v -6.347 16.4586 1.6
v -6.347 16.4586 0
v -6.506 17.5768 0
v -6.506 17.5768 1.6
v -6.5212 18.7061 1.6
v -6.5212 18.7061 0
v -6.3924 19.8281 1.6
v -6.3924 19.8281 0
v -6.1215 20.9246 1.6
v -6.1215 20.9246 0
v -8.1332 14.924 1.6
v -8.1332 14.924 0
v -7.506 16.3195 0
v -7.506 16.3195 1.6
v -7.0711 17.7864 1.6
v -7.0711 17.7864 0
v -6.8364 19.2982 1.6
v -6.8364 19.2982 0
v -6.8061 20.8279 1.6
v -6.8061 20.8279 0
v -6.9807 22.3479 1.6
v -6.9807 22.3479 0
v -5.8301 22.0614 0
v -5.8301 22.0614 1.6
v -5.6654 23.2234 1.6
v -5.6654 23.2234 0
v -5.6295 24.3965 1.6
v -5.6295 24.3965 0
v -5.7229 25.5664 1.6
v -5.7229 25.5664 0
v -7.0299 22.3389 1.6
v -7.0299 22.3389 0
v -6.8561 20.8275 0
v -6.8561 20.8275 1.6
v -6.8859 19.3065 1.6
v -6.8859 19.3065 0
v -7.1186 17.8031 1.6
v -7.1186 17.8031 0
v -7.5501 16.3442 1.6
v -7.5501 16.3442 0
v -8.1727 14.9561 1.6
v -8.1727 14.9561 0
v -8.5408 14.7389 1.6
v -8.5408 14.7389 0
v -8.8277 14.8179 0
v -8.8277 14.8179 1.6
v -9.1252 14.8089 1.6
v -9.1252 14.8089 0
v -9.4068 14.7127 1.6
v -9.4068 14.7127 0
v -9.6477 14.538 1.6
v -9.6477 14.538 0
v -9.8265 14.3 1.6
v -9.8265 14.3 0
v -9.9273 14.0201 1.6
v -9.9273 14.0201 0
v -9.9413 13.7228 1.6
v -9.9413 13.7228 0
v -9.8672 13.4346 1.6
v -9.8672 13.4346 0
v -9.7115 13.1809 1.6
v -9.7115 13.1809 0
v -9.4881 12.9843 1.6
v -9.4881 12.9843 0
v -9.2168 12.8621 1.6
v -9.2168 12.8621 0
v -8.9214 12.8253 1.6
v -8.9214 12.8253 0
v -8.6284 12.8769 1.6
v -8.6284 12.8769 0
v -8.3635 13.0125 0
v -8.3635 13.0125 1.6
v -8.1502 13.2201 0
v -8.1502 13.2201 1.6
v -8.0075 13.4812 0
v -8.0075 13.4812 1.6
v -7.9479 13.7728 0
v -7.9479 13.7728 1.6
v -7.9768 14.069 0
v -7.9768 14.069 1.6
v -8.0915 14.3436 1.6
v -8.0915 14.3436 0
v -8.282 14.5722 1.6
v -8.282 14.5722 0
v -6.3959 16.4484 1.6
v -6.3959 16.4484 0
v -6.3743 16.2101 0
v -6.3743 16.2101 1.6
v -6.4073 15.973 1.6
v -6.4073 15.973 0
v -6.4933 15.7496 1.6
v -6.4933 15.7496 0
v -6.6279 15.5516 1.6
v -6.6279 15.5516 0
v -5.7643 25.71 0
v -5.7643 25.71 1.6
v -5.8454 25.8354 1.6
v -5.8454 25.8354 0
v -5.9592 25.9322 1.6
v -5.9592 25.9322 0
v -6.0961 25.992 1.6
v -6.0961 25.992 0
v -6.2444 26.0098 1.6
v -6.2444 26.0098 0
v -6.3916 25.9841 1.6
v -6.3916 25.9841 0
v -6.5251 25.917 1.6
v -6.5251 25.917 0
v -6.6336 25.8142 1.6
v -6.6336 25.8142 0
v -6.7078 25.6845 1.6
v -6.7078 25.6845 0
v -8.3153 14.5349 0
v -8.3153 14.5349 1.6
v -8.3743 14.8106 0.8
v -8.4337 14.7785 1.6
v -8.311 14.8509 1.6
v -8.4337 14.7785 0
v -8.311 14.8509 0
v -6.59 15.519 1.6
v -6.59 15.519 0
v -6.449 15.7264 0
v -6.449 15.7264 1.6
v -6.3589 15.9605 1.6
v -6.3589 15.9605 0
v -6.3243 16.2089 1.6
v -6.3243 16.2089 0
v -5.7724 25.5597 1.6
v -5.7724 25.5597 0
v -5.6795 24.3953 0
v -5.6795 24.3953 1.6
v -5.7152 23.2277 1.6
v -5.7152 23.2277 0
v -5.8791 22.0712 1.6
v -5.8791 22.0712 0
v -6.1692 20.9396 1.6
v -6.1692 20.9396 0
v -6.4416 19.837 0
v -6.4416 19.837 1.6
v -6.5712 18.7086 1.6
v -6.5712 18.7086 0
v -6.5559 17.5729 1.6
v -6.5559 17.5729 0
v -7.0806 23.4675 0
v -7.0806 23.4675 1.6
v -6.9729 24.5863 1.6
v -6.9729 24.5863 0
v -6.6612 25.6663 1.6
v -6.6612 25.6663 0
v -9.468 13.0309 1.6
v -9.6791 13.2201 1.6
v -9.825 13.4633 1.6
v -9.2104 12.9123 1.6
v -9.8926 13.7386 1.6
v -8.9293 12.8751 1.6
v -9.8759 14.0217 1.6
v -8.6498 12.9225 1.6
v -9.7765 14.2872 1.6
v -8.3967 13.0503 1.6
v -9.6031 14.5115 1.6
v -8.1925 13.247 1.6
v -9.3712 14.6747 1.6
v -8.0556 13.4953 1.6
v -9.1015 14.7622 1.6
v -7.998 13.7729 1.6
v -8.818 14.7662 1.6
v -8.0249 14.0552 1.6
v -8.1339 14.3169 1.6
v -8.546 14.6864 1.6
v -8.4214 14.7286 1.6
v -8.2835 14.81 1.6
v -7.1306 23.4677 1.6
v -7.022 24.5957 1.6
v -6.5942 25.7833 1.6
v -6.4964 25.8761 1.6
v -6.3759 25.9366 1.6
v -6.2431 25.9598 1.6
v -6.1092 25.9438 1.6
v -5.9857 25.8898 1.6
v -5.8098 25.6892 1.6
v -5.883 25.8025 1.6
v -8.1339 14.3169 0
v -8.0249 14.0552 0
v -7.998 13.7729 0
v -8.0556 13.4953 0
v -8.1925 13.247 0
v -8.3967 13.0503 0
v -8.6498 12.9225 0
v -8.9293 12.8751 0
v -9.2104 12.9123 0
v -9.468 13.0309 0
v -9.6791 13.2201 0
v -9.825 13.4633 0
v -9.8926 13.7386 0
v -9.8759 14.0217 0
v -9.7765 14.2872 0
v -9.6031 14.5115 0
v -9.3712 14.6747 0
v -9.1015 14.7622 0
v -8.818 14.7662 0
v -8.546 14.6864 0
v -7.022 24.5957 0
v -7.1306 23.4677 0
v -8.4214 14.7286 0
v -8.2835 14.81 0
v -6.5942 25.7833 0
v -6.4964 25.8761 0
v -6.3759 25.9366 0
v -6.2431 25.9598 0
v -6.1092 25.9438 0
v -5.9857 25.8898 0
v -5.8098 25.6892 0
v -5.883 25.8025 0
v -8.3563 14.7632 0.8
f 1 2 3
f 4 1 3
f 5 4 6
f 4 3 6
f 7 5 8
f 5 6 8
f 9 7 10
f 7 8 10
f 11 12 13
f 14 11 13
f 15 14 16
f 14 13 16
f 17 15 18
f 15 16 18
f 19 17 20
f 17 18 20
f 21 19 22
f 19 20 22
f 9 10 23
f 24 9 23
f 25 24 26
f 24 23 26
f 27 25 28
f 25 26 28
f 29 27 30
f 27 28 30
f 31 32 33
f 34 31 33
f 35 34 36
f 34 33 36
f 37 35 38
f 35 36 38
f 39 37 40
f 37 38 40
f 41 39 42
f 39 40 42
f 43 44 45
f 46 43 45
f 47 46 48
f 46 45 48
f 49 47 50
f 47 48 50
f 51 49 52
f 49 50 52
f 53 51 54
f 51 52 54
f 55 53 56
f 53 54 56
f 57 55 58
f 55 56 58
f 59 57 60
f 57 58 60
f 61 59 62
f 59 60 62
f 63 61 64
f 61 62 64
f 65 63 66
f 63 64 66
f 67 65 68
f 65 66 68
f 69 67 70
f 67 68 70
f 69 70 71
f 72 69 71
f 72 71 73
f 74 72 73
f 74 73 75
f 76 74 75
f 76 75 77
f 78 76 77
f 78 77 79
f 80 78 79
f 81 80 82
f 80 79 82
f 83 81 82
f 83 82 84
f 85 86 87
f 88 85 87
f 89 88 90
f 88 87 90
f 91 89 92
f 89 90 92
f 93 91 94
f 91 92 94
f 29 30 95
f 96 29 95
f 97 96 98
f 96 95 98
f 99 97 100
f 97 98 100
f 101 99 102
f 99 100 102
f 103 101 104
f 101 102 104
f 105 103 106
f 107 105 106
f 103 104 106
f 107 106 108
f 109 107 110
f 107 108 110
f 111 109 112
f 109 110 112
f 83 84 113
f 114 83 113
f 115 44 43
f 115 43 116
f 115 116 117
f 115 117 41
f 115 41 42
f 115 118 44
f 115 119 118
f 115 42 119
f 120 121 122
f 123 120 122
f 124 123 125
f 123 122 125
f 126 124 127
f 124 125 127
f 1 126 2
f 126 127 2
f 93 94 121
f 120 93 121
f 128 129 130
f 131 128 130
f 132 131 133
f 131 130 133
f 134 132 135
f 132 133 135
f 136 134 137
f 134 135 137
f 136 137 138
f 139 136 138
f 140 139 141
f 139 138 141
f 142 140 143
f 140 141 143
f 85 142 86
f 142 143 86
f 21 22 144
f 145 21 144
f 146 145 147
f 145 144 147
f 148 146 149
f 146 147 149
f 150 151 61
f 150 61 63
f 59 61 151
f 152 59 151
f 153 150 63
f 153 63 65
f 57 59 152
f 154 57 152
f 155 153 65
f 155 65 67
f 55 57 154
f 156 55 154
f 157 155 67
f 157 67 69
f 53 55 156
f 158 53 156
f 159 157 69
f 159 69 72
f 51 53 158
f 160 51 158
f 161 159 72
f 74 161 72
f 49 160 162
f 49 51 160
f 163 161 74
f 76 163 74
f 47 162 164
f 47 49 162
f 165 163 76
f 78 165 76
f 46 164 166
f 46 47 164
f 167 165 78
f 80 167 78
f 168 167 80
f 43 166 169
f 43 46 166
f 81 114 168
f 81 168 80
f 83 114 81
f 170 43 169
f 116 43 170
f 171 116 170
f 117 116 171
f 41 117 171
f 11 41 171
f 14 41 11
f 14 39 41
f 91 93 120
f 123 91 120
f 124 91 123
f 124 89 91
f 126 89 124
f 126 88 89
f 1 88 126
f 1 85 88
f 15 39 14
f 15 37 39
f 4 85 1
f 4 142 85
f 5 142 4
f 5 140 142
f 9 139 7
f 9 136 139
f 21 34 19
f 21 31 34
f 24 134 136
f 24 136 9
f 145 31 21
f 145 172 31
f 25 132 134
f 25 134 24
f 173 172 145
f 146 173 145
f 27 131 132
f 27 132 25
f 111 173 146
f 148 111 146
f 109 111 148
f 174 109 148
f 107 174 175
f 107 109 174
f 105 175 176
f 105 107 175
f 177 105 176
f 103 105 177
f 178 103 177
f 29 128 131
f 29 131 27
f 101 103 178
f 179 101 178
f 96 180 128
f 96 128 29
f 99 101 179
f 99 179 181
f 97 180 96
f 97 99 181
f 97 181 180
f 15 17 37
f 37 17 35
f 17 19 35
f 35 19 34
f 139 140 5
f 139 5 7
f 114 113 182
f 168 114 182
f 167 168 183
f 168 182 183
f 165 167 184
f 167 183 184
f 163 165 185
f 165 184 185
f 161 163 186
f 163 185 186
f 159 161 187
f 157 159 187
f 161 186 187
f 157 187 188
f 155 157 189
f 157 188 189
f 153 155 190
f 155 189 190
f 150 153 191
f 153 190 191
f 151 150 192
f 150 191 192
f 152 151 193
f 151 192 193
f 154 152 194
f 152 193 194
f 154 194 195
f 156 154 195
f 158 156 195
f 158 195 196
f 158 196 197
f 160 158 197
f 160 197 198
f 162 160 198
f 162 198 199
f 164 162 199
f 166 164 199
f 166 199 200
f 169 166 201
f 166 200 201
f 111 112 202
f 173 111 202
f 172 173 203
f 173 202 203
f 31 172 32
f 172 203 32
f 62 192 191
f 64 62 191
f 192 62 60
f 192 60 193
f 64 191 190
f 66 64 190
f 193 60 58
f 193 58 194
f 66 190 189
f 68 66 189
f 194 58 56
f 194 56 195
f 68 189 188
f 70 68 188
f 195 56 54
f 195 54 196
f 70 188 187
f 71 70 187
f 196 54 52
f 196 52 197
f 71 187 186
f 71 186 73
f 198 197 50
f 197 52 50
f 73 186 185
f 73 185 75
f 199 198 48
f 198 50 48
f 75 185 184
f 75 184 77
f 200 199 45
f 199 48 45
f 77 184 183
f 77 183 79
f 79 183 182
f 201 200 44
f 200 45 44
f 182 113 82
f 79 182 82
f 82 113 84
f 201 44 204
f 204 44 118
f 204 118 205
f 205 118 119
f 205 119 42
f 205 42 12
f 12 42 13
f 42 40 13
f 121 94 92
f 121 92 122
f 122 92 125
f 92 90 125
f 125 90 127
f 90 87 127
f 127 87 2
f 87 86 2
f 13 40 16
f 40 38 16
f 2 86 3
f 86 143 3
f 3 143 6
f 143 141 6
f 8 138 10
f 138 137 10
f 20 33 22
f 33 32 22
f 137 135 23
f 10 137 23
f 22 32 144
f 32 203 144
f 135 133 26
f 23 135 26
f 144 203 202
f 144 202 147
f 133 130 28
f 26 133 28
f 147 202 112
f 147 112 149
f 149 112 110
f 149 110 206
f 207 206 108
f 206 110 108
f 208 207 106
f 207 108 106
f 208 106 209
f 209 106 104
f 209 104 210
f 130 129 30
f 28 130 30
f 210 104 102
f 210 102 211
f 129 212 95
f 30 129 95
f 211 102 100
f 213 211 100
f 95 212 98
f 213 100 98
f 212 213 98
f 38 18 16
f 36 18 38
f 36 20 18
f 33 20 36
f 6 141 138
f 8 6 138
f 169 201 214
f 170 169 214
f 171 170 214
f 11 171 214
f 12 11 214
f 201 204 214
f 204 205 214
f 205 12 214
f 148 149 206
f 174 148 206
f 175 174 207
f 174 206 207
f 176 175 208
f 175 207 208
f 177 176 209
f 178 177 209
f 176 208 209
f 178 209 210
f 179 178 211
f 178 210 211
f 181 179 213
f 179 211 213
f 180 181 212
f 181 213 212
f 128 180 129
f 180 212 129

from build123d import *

# Parameters (mm, degrees)
BOSS_EXTRUDE1_DEPTH = 1.6


with BuildPart() as part:
    # Sketch1 → Boss-Extrude1 (new body)
    with BuildSketch(Plane.XY):
        with BuildLine():
            Line((-8.282035958, 14.5722307), (-8.315260994, 14.534866319))
            ThreePointArc((-8.315260994, 14.534866319), (-9.467995528, 13.03085198), (-8.545955906, 14.686357635))
            add(Edge.make_bspline(
                [(-8.545955906, 14.686357635), (-8.479532127, 14.701858549), (-8.371024457, 14.742808946), (-8.203650811, 14.865336036), (-8.133207425, 14.923994424)],
                knots=[-0.055624257, -0.055624257, -0.055624257, -0.055624257, 0.480784626, 1.017193509, 1.017193509, 1.017193509, 1.017193509], degree=3))
            ThreePointArc((-8.133207425, 14.923994424), (-6.928372384, 18.538361158), (-6.980733207, 22.347892982))
            ThreePointArc((-6.980733207, 22.347892982), (-7.052666963, 24.029405703), (-6.661215609, 25.666300731))
            ThreePointArc((-6.661215609, 25.666300731), (-6.175580367, 25.956725815), (-5.772404361, 25.559690017))
            ThreePointArc((-5.772404361, 25.559690017), (-5.715205895, 23.227711177), (-6.169210056, 20.939638365))
            ThreePointArc((-6.169210056, 20.939638365), (-6.571176452, 18.70860829), (-6.395931227, 16.44843987))
            ThreePointArc((-6.395931227, 16.44843987), (-6.407309869, 15.972971601), (-6.627854712, 15.551593481))
            Line((-6.627854712, 15.551593481), (-6.589979408, 15.518952075))
            ThreePointArc((-6.589979408, 15.518952075), (-6.358902268, 15.960453449), (-6.34698023, 16.45862809))
            ThreePointArc((-6.34698023, 16.45862809), (-6.521240039, 18.706087439), (-6.121533926, 20.924572289))
            ThreePointArc((-6.121533926, 20.924572289), (-5.665389298, 23.223432543), (-5.722857434, 25.566405826))
            ThreePointArc((-5.722857434, 25.566405826), (-6.169625674, 26.006369965), (-6.707768814, 25.684543513))
            ThreePointArc((-6.707768814, 25.684543513), (-7.102436785, 24.034197861), (-7.029911938, 22.338867885))
            ThreePointArc((-7.029911938, 22.338867885), (-6.977031108, 18.550865988), (-8.172738286, 14.956142202))
            add(Edge.make_bspline(
                [(-8.540757431, 14.738914192), (-8.391889217, 14.773654662), (-8.172738286, 14.956142202)],
                knots=[0, 0, 0, 1, 1, 1], degree=2))
            ThreePointArc((-8.540757431, 14.738914192), (-9.488127519, 12.984300844), (-8.282035958, 14.5722307))
        make_face()
    extrude(amount=BOSS_EXTRUDE1_DEPTH)


solid = part.part
